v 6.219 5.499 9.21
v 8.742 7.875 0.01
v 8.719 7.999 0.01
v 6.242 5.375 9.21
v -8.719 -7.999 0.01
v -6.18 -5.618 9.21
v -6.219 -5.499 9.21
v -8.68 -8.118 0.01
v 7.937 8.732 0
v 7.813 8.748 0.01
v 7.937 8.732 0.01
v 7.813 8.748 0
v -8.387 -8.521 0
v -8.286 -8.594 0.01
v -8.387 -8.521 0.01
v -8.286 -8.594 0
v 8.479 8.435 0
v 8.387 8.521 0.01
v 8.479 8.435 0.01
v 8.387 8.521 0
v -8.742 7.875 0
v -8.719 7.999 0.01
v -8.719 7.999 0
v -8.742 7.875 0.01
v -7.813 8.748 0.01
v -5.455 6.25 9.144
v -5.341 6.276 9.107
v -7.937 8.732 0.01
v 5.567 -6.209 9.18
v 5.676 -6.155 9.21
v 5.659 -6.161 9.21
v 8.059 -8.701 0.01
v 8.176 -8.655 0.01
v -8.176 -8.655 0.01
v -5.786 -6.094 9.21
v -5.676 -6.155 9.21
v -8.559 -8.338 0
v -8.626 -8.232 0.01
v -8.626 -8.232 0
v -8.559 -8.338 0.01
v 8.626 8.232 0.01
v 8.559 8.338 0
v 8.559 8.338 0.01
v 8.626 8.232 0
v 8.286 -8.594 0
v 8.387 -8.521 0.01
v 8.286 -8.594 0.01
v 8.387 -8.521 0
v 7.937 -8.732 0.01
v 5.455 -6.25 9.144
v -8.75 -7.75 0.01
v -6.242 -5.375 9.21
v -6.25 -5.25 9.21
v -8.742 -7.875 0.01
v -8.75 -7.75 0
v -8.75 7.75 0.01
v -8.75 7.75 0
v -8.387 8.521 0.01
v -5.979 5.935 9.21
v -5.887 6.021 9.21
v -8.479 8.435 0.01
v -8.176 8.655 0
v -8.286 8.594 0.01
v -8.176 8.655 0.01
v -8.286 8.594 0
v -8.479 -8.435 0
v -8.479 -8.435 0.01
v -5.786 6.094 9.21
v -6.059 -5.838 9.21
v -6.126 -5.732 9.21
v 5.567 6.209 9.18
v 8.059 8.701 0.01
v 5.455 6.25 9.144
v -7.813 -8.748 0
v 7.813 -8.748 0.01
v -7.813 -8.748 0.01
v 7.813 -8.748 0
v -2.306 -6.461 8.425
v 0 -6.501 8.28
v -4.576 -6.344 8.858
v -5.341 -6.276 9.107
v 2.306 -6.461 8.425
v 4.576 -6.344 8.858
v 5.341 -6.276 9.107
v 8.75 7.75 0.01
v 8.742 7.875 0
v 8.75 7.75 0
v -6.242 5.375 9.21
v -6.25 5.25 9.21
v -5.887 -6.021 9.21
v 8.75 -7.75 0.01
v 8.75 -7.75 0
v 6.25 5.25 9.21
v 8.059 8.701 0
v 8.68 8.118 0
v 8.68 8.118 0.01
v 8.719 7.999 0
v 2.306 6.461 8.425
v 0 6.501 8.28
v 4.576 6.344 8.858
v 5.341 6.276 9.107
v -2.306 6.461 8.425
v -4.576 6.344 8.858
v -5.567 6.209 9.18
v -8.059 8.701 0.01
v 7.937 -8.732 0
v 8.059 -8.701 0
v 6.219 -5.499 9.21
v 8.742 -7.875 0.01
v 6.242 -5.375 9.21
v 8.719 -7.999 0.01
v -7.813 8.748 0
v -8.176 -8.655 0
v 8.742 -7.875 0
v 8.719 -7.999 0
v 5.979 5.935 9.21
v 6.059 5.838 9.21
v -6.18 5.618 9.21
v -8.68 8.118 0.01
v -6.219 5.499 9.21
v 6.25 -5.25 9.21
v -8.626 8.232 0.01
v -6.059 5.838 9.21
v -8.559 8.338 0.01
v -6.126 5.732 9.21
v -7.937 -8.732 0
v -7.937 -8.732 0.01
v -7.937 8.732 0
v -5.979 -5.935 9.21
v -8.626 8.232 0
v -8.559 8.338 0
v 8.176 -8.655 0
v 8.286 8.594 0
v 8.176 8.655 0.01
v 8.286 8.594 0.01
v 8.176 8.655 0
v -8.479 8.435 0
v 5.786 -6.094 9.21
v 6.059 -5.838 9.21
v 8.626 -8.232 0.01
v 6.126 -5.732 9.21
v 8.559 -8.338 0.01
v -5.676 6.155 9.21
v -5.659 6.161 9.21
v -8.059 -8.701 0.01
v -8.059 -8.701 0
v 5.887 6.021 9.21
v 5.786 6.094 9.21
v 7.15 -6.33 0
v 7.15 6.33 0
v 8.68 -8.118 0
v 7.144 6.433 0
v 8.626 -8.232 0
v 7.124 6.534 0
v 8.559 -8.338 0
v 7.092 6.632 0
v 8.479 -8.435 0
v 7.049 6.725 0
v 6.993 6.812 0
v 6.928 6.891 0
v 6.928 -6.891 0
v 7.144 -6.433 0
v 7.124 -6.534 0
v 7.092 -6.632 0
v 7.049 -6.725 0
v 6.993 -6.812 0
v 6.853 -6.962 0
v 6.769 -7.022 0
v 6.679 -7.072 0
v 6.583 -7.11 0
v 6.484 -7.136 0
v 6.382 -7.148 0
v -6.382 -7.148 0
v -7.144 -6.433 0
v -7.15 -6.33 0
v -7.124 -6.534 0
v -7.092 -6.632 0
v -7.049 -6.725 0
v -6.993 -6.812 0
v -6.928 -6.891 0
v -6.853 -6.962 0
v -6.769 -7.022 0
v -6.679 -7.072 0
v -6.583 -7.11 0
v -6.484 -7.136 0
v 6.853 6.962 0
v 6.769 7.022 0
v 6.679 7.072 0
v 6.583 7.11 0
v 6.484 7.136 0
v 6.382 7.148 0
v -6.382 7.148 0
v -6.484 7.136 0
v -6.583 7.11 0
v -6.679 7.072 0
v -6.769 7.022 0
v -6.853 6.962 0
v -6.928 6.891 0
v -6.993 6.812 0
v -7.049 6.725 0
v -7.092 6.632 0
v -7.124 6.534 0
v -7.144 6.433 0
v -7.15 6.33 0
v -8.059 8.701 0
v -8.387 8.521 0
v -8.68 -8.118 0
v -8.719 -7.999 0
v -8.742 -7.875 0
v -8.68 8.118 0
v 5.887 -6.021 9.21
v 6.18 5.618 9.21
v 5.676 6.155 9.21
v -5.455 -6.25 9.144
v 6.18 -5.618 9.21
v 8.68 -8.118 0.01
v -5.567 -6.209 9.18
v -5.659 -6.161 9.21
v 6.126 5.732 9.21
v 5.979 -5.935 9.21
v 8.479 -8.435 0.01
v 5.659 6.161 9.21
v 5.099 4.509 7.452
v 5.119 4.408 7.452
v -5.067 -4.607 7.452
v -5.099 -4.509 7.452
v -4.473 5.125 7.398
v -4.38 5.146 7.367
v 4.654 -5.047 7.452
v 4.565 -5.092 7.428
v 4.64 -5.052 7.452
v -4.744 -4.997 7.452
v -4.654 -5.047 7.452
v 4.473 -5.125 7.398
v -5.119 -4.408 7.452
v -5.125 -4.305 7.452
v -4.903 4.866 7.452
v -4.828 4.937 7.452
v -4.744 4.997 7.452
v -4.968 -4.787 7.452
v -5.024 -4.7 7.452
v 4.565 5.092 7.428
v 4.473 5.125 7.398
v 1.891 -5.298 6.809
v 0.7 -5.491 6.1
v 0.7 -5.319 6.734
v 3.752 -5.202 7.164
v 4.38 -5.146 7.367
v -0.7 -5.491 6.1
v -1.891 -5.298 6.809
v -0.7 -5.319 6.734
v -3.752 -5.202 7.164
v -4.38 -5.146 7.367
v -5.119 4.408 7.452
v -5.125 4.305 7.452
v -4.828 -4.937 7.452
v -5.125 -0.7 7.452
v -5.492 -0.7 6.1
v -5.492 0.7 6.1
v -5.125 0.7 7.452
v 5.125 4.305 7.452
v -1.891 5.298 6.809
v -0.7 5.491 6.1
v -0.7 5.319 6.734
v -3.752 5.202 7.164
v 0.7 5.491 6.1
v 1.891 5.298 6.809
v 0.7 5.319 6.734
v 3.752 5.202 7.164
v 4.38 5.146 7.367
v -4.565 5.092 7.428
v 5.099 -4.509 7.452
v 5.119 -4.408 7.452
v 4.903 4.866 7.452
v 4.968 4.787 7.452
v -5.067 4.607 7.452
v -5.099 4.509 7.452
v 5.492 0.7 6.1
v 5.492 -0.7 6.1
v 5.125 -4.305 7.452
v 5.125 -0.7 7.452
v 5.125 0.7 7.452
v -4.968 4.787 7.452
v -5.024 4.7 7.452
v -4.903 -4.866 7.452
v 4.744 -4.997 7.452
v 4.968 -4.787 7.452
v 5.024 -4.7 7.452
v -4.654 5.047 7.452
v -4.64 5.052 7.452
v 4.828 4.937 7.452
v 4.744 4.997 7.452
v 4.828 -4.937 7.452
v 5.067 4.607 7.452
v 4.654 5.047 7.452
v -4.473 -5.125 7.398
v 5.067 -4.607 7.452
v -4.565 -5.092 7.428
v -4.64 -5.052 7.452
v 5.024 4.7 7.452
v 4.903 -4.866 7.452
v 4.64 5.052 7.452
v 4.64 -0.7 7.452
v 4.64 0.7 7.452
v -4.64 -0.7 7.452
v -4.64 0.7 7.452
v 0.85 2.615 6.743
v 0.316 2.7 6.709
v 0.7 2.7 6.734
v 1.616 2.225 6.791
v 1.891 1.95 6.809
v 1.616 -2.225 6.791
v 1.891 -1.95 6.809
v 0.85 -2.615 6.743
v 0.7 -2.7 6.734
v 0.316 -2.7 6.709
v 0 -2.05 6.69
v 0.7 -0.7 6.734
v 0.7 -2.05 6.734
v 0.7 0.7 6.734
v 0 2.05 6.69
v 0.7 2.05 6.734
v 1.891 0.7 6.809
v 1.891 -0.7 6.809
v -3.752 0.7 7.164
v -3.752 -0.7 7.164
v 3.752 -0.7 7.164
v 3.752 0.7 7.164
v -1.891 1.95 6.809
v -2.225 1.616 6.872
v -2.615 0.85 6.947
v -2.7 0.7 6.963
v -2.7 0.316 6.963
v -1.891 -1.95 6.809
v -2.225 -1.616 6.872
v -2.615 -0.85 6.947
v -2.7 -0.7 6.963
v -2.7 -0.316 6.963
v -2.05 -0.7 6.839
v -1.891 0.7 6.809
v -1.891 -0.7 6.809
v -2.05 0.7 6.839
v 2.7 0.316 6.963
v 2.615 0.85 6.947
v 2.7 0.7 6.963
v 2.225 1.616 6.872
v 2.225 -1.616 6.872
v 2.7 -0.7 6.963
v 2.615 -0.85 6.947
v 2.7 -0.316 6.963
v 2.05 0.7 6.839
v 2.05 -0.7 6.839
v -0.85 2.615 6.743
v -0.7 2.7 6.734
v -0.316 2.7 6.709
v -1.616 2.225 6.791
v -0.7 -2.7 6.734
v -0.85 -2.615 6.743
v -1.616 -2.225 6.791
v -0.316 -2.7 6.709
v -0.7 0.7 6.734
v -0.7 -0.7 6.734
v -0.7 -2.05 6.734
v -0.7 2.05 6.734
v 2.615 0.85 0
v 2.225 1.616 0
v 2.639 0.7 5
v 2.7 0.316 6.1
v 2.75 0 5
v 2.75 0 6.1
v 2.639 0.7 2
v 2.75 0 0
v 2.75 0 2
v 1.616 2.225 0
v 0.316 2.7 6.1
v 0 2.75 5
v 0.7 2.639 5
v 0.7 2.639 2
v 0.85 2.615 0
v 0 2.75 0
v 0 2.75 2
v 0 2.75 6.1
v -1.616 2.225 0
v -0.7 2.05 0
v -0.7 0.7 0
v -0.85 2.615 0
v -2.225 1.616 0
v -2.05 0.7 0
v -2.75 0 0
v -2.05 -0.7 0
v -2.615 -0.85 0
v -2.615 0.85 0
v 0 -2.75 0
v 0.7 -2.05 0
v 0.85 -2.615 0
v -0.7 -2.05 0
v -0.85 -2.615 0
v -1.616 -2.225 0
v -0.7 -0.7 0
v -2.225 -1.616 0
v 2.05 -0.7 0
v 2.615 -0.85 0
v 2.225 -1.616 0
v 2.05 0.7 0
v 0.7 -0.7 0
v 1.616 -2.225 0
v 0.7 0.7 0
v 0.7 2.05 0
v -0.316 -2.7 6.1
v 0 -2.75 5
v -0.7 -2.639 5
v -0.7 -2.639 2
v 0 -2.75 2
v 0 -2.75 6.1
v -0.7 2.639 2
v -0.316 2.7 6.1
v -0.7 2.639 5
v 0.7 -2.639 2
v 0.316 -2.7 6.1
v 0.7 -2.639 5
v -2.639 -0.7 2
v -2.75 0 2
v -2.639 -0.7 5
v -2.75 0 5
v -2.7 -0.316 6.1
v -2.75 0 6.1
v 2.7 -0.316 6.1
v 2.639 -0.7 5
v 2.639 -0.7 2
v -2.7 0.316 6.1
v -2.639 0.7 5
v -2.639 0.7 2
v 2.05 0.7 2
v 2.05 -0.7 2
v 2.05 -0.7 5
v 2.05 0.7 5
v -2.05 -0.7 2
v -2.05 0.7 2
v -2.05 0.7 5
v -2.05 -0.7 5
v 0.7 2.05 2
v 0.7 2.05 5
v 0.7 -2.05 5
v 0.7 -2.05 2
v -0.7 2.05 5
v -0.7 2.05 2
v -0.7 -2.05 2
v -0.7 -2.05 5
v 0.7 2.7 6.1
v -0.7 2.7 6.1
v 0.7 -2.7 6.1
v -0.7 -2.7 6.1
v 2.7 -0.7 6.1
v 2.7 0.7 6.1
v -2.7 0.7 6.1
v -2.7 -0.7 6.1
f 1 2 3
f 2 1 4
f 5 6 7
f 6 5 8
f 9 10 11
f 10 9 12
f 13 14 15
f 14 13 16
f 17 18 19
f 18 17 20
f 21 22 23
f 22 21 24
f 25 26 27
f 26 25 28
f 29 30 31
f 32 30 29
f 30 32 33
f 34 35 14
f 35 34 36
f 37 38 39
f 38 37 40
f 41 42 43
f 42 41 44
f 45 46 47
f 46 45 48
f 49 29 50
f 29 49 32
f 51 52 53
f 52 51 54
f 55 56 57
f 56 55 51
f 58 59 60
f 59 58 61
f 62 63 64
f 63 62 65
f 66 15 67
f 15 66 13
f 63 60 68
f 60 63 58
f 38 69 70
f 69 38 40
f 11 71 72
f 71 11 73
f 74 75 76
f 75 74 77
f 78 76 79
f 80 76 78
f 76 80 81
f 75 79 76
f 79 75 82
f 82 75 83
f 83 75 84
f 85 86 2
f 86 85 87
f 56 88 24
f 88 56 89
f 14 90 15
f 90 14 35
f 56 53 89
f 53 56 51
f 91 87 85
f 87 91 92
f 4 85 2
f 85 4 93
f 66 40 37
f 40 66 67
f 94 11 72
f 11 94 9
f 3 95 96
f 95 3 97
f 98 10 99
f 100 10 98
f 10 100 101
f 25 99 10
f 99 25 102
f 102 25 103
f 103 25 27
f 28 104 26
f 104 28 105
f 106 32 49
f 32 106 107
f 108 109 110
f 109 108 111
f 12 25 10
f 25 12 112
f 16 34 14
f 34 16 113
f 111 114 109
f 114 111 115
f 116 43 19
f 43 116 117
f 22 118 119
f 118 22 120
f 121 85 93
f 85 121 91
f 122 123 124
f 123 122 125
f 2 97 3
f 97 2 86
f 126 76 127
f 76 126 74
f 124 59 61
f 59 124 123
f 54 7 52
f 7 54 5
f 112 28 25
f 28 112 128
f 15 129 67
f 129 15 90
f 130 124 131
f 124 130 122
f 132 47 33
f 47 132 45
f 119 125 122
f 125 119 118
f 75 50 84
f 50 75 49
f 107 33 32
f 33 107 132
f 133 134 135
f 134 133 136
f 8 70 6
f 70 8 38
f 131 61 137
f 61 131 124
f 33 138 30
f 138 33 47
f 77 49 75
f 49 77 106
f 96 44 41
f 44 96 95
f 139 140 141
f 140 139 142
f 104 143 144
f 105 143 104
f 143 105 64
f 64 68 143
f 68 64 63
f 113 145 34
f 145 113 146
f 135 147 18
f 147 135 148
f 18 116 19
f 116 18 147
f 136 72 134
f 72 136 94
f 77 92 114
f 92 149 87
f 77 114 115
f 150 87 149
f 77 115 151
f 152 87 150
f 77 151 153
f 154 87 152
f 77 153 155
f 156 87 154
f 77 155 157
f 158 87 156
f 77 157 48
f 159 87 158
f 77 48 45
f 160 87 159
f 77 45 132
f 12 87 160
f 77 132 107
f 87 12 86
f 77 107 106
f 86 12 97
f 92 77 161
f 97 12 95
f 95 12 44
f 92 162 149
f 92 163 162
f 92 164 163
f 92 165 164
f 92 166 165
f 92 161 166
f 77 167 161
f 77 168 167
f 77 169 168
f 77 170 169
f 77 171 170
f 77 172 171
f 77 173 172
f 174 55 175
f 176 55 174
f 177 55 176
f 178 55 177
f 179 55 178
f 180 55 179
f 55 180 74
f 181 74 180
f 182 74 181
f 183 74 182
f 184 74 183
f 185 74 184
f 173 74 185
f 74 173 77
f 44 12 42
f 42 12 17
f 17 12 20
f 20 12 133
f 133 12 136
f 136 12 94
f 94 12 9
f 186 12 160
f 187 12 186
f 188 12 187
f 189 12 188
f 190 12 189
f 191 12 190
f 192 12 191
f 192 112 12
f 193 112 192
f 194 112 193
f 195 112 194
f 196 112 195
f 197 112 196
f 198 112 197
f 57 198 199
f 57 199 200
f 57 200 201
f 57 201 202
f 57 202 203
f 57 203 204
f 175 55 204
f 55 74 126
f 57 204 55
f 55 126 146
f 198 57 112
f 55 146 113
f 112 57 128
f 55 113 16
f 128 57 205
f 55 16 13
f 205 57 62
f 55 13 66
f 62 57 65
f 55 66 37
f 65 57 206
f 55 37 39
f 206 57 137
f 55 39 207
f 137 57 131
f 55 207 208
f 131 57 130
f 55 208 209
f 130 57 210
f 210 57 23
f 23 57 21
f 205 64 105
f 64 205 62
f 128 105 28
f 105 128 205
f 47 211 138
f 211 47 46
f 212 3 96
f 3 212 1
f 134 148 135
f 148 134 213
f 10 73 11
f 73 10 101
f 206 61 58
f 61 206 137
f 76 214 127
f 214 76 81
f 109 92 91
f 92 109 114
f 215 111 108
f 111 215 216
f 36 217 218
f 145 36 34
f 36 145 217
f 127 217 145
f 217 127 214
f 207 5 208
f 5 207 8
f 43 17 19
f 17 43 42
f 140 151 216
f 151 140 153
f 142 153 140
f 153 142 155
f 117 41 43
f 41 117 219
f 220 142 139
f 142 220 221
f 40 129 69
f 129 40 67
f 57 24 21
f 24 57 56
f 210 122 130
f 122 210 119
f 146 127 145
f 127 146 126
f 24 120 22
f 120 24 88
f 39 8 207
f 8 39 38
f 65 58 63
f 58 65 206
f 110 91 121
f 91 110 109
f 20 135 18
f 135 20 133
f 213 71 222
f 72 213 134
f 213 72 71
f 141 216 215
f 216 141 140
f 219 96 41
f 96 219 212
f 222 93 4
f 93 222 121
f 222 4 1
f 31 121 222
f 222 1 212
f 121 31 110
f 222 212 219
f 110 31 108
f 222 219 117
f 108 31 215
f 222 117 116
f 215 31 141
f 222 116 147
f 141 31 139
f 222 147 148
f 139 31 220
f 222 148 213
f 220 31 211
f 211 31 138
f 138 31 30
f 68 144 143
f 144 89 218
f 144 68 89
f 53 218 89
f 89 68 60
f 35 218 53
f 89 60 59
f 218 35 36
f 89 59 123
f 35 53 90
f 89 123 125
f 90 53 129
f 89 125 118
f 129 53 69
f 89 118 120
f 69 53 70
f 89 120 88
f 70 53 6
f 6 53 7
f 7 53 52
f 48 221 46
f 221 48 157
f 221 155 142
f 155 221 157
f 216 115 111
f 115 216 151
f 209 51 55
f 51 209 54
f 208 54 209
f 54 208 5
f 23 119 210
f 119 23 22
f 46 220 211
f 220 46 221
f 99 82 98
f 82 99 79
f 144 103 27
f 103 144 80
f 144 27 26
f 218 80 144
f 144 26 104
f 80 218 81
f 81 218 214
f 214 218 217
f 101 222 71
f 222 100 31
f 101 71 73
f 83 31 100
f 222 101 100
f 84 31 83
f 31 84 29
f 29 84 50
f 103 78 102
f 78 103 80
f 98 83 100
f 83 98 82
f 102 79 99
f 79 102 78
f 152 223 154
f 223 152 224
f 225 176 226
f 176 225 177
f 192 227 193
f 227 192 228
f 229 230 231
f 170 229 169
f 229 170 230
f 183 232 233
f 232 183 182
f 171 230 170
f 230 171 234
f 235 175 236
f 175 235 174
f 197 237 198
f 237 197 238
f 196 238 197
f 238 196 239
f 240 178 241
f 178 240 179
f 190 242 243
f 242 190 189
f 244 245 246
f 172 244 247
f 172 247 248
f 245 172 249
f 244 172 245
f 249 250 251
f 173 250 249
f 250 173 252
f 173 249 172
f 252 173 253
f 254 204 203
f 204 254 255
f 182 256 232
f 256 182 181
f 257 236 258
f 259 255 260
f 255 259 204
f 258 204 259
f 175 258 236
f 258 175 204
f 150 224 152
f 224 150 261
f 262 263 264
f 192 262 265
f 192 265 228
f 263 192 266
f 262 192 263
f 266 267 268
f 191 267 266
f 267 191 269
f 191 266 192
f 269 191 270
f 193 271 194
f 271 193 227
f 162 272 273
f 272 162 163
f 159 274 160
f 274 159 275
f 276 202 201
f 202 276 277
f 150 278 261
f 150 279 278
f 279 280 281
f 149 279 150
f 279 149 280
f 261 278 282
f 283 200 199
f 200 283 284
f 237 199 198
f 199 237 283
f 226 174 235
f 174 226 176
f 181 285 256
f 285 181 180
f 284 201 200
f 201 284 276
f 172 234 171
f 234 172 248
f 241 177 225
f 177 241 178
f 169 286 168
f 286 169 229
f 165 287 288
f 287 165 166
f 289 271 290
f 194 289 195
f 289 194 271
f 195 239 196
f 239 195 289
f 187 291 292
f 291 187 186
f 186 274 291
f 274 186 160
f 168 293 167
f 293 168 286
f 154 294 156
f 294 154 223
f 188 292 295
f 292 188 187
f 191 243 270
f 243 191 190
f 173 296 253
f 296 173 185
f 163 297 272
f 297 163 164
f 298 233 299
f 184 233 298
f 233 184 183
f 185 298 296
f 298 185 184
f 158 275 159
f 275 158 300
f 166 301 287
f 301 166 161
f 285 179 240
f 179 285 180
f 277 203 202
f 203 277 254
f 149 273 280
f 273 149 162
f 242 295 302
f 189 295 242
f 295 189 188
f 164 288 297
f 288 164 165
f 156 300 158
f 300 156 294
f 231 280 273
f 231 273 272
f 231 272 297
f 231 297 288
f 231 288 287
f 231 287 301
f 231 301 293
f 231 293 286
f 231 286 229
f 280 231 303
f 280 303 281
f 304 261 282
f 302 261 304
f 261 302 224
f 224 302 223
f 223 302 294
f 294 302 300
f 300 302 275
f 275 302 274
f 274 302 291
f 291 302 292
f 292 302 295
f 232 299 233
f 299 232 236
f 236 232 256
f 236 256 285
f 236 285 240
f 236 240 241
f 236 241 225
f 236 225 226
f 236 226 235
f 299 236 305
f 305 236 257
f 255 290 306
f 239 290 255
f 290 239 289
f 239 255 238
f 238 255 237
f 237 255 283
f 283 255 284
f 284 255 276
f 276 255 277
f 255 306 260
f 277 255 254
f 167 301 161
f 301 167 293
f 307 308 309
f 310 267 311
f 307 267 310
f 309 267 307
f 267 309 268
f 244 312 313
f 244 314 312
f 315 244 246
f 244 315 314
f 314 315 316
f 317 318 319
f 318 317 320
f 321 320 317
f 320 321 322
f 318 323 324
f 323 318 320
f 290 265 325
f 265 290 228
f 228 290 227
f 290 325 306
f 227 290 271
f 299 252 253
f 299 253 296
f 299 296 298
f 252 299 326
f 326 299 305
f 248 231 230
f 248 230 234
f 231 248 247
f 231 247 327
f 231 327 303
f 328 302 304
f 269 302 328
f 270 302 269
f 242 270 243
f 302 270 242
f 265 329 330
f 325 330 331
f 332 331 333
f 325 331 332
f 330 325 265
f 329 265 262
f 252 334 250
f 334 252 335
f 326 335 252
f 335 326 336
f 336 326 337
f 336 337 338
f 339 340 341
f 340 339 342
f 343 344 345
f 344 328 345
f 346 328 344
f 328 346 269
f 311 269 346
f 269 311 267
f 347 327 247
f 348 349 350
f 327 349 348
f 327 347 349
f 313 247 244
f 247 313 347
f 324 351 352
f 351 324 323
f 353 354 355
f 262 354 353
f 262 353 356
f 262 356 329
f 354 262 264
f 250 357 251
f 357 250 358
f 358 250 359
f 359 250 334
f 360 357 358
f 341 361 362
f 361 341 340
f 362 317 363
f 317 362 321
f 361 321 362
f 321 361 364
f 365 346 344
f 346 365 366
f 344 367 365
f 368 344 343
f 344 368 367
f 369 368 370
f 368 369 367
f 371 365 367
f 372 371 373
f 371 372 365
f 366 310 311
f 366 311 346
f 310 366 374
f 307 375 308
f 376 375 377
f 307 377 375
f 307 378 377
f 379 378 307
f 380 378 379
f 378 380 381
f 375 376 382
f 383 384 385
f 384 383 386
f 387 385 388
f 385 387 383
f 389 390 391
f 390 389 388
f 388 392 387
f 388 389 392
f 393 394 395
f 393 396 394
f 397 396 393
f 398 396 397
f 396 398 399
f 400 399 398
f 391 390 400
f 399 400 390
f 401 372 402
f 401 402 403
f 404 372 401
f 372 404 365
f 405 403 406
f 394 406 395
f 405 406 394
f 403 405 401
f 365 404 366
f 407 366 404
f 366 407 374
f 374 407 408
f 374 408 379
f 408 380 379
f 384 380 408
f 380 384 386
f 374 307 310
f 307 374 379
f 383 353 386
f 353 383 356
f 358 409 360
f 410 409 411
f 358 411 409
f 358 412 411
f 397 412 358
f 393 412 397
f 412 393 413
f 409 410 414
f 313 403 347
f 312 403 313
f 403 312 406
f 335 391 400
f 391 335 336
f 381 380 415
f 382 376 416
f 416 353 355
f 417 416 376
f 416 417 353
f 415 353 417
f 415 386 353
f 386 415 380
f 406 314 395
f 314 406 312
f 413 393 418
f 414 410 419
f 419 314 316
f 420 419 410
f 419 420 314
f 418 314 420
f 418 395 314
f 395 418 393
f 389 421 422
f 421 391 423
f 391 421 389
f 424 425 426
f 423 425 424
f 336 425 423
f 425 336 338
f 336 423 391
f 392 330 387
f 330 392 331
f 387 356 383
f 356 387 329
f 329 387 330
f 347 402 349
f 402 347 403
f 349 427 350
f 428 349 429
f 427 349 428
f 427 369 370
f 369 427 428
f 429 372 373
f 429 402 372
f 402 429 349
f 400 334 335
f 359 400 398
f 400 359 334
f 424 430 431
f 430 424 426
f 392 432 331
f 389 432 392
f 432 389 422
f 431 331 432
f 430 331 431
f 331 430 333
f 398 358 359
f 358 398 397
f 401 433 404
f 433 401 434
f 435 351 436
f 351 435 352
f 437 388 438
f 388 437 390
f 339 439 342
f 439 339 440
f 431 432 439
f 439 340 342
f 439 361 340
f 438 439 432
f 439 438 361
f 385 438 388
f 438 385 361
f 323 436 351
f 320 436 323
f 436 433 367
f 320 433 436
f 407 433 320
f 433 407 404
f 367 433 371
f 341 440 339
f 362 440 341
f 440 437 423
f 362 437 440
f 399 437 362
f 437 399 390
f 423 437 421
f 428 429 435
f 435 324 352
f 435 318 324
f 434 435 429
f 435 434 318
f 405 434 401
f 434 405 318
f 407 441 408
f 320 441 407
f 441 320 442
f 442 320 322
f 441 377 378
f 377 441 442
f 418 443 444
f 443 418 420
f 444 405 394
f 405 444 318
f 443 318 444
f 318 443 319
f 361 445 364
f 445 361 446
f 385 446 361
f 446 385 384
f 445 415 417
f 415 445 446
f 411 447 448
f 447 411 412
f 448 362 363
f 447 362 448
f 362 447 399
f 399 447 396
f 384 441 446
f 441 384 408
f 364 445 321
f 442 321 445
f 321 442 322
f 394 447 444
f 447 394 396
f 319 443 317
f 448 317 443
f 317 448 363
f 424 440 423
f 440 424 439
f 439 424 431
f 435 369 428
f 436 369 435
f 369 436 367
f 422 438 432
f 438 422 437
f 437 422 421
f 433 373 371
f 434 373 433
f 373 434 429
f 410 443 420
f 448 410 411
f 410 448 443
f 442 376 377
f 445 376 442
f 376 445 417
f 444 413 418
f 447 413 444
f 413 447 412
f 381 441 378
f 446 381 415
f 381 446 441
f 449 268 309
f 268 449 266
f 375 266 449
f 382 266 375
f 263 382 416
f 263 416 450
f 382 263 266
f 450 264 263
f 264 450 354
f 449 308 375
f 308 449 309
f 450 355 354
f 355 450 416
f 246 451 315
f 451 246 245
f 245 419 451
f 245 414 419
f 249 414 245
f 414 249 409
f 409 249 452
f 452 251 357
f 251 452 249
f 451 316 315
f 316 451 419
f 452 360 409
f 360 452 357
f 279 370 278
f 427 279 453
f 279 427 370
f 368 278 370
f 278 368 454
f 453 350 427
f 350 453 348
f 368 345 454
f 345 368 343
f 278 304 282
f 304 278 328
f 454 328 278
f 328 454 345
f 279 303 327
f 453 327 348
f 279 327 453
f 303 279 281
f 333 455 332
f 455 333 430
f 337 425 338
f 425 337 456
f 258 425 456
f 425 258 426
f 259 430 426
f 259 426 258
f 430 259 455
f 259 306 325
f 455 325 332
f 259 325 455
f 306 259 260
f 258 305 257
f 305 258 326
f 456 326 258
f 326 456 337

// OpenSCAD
height = 9.2;
top_side = 12.5;
bottom_side = 17.5;
corner_diameter = 2;
stem_diameter=5.5;
inner_hollow_scale = 0.82;

// I'm printing in my local library and don't have access to printer settings,
// So I have modified slots a little bit to make them tighter.
// Original dimensions were [4.2,1.5,40]
slot_length = 4.1;
slot_width = 1.4;
slots = [[slot_length,slot_width, inner_hollow_scale*height], [slot_width,slot_length, inner_hollow_scale*height]];

check_cubes(all=false, top=false, bottom=false, wall=false);

// sharp, postsoft, presoft
style = "presoft";


corner_offset = corner_diameter * sqrt(2);

cone_top_diameter = circumscribed_circle(top_side) - corner_offset;
cone_bottom_diameter = circumscribed_circle(bottom_side) - corner_offset;

// cap
difference() {
    keycap();
    translate([0, 0, -0.1]) scale(inner_hollow_scale) keycap();
}

// stem
difference() {
    cylinder(inner_hollow_scale*height, d=stem_diameter, $fn=20);
    translate([0,0, inner_hollow_scale*height/2-0.1]) cube(slots[0], center=true);
    translate([0,0, inner_hollow_scale*height/2-0.1]) cube(slots[1], center=true);
    translate([0, 0, 3.5]) cube([6.1, slot_width, 3], center=true);
    translate([0, 0, 3.5]) cube([slot_width, 6.1, 3], center=true);
}
// struts
translate([0, 4.6, 6.8]) cube([slot_width, 3.8, slot_width], center=true);
translate([0, -4.6, 6.8]) cube([slot_width, 3.8, slot_width], center=true);
translate([4.6, 0, 6.8]) cube([3.8, slot_width, slot_width], center=true);
translate([-4.6, 0, 6.8]) cube([3.8, slot_width, slot_width], center=true);



module keycap() {
    // sharp
    if (style=="sharp") {
        difference() {
                rotate([0, 0, 45]) cylinder(height,d2=circumscribed_circle(top_side), d1=circumscribed_circle(bottom_side), $fn=4);
                translate([0, 0, 2.9*height]) rotate([90, 90, 0]) cylinder(bottom_side,r=2*height, $fn=50, center=true);
        }
    }

    // post soft
    if (style=="postsoft") {
        minkowski() {
            difference() {
                compensation = sqrt(2) * corner_diameter;
                translate([0, 0, corner_diameter/2]) rotate([0, 0, 45]) cylinder(
                    height - corner_diameter,
                    d2=circumscribed_circle(top_side) - compensation,
                    d1=circumscribed_circle(bottom_side) - compensation,
                    $fn=4
                );
                translate([0, 0, 2.805*height]) rotate([90, 90, 0]) cylinder(bottom_side,r=2*height, $fn=50, center=true);
            }    
            sphere(d=corner_diameter, $fn=50);
        }
    }

    // pre soft
    if (style=="presoft") {
        difference() {
            minkowski() {
                rotate([0, 0, 45]) cylinder(height,d1=cone_bottom_diameter,d2=cone_top_diameter,$fn=4);
                cylinder(0.01,d=corner_diameter,$fn=50);                
            };
            translate([0, 0, 2.9*height]) rotate([90, 90, 0]) cylinder(bottom_side,r=2*height, $fn=50, center=true);
        } 
    }
}

module check_cubes(all=false, bottom=false, top=false, wall=false) {
    // Dimensions check cubes
    if (all || bottom) {
        color("Red") { translate([-bottom_side/2, 0, 0]) cube([bottom_side, bottom_side, height]); }
    }
    if (all || top) {
        color("Green") { translate([-top_side/2, -top_side/2, 0]) cube([top_side, top_side, height]); }
    }
    if (all || wall) {
        color("Orange") { translate([bottom_side/2, -bottom_side/2, 0]) cube([1.7, 1.7, 1.7]); }
    }
}

function circumscribed_circle(side) = side * sqrt(2);
